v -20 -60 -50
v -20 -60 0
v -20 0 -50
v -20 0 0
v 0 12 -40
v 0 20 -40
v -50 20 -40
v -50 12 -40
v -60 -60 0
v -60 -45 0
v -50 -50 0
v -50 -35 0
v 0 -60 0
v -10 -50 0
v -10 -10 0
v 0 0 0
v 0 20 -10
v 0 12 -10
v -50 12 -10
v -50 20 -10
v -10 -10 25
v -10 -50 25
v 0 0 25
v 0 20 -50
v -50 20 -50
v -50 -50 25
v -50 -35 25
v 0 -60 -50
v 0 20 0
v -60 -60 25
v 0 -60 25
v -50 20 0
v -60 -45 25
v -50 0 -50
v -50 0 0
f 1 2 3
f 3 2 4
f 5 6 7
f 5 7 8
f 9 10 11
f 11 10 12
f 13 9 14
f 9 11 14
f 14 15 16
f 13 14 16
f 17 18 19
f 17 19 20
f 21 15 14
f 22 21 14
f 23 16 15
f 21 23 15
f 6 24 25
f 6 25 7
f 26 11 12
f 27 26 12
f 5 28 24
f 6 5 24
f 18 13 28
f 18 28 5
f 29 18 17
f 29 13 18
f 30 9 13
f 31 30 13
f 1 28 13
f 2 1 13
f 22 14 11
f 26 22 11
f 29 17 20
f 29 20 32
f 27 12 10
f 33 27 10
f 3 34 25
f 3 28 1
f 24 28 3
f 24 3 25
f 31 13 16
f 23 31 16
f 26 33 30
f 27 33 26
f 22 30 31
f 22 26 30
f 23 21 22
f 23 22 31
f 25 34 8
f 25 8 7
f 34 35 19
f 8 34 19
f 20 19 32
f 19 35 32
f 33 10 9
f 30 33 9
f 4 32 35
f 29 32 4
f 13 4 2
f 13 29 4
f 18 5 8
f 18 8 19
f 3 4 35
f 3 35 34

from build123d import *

# Parameters (mm, degrees)
F1_DEPTH = 25
F2_W     = 60
F2_H     = 50
F3_DEPTH = 20
F4_DEPTH = 50


with BuildPart() as f1:
    # F0 (on Top) → F1 (new body)
    with BuildSketch(Plane.XY):
        Polygon((-60, -45), (-60, -60), (0, -60), (0, 0), (-10, -10), (-10, -50), (-50, -50), (-50, -35), align=None)
    extrude(amount=F1_DEPTH)


with BuildPart() as f3:
    # F2 (on Right) → F3 (new body)
    with BuildSketch(Plane.YZ):
        with Locations((-30, -25)):
            Rectangle(F2_W, F2_H)
    extrude(amount=-F3_DEPTH)

    # F2 (on Right) → F4 (join)
    with BuildSketch(Plane.YZ):
        Polygon((0, 0), (0, -50), (20, -50), (20, -40), (12, -40), (12, -10), (20, -10), (20, 0), align=None)
    extrude(amount=-F4_DEPTH)


solid = Compound([f1.part, f3.part])
